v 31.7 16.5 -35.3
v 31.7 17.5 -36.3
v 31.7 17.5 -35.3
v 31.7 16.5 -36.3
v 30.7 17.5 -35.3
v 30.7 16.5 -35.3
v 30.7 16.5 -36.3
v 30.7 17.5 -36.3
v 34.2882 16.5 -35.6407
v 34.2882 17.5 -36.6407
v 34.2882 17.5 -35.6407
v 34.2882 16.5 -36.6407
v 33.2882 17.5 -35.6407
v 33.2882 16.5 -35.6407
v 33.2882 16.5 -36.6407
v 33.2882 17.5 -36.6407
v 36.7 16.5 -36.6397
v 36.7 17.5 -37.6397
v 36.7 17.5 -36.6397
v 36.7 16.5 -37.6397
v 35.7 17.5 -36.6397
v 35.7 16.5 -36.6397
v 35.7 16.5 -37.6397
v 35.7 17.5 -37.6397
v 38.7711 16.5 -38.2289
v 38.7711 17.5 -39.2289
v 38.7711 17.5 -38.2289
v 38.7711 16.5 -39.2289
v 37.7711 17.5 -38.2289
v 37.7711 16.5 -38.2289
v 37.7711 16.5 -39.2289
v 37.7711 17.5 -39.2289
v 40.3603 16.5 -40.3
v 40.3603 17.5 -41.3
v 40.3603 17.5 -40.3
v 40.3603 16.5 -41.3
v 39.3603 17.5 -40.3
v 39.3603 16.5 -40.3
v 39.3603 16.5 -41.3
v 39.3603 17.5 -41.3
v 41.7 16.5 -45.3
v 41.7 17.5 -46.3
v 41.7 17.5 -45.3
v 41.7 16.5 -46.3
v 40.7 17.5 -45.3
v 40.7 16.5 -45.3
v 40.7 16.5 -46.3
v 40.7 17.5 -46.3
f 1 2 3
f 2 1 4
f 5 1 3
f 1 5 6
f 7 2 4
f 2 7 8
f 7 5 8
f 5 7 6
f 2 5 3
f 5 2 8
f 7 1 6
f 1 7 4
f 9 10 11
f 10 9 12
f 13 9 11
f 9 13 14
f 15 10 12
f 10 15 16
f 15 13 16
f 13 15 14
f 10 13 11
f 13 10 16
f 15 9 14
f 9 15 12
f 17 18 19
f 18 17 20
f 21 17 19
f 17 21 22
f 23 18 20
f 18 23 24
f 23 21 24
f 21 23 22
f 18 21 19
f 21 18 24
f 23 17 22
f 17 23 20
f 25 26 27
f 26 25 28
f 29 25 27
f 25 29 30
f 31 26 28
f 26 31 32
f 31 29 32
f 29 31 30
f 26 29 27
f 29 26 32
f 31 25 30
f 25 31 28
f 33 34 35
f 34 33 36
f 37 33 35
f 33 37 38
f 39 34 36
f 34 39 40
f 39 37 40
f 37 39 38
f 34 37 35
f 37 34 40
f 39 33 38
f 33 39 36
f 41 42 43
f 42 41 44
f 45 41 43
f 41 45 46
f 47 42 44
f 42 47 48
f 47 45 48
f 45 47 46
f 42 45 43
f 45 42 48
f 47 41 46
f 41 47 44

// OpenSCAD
precision = .1;
radius = 20;
startwinkel = 270;
endwinkel = 360;
schritt = 200;
basislaenge = 71.6;
basis = [
  [31.2, 17,-basislaenge/2], [27,12,basislaenge/2] 
];


function f(w,r) =  [r*sin(w), r*cos(w)];
//echo("f90=",f(90, r= 10));

//starta = f(0,r=10);
//echo("fstart=",starta);

//function applyFunc(rad=5,list=[f(0,r=rad)], i=1)= i>5 ?  //doesn't work, take care to nitialize the first list outside
// function applyFunc(rad=5,list, i=1)= i>5 ?  //doesn't work, take care to nitialize the first list outside
//    list :   //return the finisched list
//    applyFunc(rad=rad,list= [each list, let(fi = f(w=i,r=rad))  if (abs(abs(fi[1]) -abs(list[len(list)-1][1])) >.01) fi], i+1); //add only of abs difference is smaller than spec
// //echo("make list ",applyFunc(rad = 10)); //doesn't work!
// //echo("make list ",applyFunc(rad = 10, list=starta));
function absdiff(p1,p2) =  p1>p2? abs(p1 - p2): abs(p2 - p1);
function applyFunc( rad=5, prec=.01, sw=0, ew=90,step = 3, prec=.01, list ) =
 let( list = is_undef(list) ? [f(sw,r=rad)] : list,
   fi=f(sw,rad),
   pointdiff = absdiff(fi[1],list[len(list)-1][1])
     )
  //echo("sw = ",sw ,ew," diff:",pointdiff,prec,fi)
  (sw >= ew )? let(fi=f(ew,rad))[for(i=[0:len(list)-2]) if(absdiff(fi[1],list[i][1])> prec)list[i], fi] : 
  
  pointdiff >prec?
  applyFunc( rad=rad, prec=prec, sw=sw+step,ew=ew,step=step, list=[ each list, fi ] ):
  applyFunc( rad=rad, prec=prec, sw=sw+step,ew=ew,step=step, list=list );

function xaufrunden(toround, r, fn, sw, ew, prec=precision)= 
let(
    off=f(w=sw, r=r),
    step = (ew-sw)/fn,
    pos= applyFunc( rad=r, sw=sw, ew=ew,step = step, prec=prec)
    )
  [for(apos = pos) len(toround) == 1?[apos[0]+toround[0]]:
                   len(toround) == 2?[apos[0]+toround[0],apos[1]+toround[1]-off[1]]:
                   [apos[0]+toround[0],toround[1],toround[2]+apos[1]-off[1]]
  ] ;



 color("blue") translate([basis[0][0],basis[0][1],basis[0][2]]) cube(1,center= true);
pos= xaufrunden(toround = basis[0], r=10, fn=6, sw=0, ew=90);
  for(i=[0:len(pos)-1])
    let(mypos = pos[i])
   translate([mypos[0],mypos[1],mypos[2]]) cube(1,center= true);
// pos= applyFunc( rad=radius, sw=startwinkel, ew=endwinkel,step = (endwinkel - startwinkel)/schritt, prec=precision );
//  color("blue") translate([pos[0][0],pos[0][1],0]) cube(1,center= true);
// echo("applyFunc", pos);
//  color("blue") translate([pos[0][0],pos[0][1],0]) cube(1,center= true);
//  lastindex = len(pos)-1;
//  for(i=[1:lastindex-1])
//    let(mypos = pos[i])
//   translate([mypos[0],mypos[1],0]) cube(1,center= true);
//  color("red") translate([pos[lastindex][0],pos[lastindex][1],0]) cube(1,center= true);
